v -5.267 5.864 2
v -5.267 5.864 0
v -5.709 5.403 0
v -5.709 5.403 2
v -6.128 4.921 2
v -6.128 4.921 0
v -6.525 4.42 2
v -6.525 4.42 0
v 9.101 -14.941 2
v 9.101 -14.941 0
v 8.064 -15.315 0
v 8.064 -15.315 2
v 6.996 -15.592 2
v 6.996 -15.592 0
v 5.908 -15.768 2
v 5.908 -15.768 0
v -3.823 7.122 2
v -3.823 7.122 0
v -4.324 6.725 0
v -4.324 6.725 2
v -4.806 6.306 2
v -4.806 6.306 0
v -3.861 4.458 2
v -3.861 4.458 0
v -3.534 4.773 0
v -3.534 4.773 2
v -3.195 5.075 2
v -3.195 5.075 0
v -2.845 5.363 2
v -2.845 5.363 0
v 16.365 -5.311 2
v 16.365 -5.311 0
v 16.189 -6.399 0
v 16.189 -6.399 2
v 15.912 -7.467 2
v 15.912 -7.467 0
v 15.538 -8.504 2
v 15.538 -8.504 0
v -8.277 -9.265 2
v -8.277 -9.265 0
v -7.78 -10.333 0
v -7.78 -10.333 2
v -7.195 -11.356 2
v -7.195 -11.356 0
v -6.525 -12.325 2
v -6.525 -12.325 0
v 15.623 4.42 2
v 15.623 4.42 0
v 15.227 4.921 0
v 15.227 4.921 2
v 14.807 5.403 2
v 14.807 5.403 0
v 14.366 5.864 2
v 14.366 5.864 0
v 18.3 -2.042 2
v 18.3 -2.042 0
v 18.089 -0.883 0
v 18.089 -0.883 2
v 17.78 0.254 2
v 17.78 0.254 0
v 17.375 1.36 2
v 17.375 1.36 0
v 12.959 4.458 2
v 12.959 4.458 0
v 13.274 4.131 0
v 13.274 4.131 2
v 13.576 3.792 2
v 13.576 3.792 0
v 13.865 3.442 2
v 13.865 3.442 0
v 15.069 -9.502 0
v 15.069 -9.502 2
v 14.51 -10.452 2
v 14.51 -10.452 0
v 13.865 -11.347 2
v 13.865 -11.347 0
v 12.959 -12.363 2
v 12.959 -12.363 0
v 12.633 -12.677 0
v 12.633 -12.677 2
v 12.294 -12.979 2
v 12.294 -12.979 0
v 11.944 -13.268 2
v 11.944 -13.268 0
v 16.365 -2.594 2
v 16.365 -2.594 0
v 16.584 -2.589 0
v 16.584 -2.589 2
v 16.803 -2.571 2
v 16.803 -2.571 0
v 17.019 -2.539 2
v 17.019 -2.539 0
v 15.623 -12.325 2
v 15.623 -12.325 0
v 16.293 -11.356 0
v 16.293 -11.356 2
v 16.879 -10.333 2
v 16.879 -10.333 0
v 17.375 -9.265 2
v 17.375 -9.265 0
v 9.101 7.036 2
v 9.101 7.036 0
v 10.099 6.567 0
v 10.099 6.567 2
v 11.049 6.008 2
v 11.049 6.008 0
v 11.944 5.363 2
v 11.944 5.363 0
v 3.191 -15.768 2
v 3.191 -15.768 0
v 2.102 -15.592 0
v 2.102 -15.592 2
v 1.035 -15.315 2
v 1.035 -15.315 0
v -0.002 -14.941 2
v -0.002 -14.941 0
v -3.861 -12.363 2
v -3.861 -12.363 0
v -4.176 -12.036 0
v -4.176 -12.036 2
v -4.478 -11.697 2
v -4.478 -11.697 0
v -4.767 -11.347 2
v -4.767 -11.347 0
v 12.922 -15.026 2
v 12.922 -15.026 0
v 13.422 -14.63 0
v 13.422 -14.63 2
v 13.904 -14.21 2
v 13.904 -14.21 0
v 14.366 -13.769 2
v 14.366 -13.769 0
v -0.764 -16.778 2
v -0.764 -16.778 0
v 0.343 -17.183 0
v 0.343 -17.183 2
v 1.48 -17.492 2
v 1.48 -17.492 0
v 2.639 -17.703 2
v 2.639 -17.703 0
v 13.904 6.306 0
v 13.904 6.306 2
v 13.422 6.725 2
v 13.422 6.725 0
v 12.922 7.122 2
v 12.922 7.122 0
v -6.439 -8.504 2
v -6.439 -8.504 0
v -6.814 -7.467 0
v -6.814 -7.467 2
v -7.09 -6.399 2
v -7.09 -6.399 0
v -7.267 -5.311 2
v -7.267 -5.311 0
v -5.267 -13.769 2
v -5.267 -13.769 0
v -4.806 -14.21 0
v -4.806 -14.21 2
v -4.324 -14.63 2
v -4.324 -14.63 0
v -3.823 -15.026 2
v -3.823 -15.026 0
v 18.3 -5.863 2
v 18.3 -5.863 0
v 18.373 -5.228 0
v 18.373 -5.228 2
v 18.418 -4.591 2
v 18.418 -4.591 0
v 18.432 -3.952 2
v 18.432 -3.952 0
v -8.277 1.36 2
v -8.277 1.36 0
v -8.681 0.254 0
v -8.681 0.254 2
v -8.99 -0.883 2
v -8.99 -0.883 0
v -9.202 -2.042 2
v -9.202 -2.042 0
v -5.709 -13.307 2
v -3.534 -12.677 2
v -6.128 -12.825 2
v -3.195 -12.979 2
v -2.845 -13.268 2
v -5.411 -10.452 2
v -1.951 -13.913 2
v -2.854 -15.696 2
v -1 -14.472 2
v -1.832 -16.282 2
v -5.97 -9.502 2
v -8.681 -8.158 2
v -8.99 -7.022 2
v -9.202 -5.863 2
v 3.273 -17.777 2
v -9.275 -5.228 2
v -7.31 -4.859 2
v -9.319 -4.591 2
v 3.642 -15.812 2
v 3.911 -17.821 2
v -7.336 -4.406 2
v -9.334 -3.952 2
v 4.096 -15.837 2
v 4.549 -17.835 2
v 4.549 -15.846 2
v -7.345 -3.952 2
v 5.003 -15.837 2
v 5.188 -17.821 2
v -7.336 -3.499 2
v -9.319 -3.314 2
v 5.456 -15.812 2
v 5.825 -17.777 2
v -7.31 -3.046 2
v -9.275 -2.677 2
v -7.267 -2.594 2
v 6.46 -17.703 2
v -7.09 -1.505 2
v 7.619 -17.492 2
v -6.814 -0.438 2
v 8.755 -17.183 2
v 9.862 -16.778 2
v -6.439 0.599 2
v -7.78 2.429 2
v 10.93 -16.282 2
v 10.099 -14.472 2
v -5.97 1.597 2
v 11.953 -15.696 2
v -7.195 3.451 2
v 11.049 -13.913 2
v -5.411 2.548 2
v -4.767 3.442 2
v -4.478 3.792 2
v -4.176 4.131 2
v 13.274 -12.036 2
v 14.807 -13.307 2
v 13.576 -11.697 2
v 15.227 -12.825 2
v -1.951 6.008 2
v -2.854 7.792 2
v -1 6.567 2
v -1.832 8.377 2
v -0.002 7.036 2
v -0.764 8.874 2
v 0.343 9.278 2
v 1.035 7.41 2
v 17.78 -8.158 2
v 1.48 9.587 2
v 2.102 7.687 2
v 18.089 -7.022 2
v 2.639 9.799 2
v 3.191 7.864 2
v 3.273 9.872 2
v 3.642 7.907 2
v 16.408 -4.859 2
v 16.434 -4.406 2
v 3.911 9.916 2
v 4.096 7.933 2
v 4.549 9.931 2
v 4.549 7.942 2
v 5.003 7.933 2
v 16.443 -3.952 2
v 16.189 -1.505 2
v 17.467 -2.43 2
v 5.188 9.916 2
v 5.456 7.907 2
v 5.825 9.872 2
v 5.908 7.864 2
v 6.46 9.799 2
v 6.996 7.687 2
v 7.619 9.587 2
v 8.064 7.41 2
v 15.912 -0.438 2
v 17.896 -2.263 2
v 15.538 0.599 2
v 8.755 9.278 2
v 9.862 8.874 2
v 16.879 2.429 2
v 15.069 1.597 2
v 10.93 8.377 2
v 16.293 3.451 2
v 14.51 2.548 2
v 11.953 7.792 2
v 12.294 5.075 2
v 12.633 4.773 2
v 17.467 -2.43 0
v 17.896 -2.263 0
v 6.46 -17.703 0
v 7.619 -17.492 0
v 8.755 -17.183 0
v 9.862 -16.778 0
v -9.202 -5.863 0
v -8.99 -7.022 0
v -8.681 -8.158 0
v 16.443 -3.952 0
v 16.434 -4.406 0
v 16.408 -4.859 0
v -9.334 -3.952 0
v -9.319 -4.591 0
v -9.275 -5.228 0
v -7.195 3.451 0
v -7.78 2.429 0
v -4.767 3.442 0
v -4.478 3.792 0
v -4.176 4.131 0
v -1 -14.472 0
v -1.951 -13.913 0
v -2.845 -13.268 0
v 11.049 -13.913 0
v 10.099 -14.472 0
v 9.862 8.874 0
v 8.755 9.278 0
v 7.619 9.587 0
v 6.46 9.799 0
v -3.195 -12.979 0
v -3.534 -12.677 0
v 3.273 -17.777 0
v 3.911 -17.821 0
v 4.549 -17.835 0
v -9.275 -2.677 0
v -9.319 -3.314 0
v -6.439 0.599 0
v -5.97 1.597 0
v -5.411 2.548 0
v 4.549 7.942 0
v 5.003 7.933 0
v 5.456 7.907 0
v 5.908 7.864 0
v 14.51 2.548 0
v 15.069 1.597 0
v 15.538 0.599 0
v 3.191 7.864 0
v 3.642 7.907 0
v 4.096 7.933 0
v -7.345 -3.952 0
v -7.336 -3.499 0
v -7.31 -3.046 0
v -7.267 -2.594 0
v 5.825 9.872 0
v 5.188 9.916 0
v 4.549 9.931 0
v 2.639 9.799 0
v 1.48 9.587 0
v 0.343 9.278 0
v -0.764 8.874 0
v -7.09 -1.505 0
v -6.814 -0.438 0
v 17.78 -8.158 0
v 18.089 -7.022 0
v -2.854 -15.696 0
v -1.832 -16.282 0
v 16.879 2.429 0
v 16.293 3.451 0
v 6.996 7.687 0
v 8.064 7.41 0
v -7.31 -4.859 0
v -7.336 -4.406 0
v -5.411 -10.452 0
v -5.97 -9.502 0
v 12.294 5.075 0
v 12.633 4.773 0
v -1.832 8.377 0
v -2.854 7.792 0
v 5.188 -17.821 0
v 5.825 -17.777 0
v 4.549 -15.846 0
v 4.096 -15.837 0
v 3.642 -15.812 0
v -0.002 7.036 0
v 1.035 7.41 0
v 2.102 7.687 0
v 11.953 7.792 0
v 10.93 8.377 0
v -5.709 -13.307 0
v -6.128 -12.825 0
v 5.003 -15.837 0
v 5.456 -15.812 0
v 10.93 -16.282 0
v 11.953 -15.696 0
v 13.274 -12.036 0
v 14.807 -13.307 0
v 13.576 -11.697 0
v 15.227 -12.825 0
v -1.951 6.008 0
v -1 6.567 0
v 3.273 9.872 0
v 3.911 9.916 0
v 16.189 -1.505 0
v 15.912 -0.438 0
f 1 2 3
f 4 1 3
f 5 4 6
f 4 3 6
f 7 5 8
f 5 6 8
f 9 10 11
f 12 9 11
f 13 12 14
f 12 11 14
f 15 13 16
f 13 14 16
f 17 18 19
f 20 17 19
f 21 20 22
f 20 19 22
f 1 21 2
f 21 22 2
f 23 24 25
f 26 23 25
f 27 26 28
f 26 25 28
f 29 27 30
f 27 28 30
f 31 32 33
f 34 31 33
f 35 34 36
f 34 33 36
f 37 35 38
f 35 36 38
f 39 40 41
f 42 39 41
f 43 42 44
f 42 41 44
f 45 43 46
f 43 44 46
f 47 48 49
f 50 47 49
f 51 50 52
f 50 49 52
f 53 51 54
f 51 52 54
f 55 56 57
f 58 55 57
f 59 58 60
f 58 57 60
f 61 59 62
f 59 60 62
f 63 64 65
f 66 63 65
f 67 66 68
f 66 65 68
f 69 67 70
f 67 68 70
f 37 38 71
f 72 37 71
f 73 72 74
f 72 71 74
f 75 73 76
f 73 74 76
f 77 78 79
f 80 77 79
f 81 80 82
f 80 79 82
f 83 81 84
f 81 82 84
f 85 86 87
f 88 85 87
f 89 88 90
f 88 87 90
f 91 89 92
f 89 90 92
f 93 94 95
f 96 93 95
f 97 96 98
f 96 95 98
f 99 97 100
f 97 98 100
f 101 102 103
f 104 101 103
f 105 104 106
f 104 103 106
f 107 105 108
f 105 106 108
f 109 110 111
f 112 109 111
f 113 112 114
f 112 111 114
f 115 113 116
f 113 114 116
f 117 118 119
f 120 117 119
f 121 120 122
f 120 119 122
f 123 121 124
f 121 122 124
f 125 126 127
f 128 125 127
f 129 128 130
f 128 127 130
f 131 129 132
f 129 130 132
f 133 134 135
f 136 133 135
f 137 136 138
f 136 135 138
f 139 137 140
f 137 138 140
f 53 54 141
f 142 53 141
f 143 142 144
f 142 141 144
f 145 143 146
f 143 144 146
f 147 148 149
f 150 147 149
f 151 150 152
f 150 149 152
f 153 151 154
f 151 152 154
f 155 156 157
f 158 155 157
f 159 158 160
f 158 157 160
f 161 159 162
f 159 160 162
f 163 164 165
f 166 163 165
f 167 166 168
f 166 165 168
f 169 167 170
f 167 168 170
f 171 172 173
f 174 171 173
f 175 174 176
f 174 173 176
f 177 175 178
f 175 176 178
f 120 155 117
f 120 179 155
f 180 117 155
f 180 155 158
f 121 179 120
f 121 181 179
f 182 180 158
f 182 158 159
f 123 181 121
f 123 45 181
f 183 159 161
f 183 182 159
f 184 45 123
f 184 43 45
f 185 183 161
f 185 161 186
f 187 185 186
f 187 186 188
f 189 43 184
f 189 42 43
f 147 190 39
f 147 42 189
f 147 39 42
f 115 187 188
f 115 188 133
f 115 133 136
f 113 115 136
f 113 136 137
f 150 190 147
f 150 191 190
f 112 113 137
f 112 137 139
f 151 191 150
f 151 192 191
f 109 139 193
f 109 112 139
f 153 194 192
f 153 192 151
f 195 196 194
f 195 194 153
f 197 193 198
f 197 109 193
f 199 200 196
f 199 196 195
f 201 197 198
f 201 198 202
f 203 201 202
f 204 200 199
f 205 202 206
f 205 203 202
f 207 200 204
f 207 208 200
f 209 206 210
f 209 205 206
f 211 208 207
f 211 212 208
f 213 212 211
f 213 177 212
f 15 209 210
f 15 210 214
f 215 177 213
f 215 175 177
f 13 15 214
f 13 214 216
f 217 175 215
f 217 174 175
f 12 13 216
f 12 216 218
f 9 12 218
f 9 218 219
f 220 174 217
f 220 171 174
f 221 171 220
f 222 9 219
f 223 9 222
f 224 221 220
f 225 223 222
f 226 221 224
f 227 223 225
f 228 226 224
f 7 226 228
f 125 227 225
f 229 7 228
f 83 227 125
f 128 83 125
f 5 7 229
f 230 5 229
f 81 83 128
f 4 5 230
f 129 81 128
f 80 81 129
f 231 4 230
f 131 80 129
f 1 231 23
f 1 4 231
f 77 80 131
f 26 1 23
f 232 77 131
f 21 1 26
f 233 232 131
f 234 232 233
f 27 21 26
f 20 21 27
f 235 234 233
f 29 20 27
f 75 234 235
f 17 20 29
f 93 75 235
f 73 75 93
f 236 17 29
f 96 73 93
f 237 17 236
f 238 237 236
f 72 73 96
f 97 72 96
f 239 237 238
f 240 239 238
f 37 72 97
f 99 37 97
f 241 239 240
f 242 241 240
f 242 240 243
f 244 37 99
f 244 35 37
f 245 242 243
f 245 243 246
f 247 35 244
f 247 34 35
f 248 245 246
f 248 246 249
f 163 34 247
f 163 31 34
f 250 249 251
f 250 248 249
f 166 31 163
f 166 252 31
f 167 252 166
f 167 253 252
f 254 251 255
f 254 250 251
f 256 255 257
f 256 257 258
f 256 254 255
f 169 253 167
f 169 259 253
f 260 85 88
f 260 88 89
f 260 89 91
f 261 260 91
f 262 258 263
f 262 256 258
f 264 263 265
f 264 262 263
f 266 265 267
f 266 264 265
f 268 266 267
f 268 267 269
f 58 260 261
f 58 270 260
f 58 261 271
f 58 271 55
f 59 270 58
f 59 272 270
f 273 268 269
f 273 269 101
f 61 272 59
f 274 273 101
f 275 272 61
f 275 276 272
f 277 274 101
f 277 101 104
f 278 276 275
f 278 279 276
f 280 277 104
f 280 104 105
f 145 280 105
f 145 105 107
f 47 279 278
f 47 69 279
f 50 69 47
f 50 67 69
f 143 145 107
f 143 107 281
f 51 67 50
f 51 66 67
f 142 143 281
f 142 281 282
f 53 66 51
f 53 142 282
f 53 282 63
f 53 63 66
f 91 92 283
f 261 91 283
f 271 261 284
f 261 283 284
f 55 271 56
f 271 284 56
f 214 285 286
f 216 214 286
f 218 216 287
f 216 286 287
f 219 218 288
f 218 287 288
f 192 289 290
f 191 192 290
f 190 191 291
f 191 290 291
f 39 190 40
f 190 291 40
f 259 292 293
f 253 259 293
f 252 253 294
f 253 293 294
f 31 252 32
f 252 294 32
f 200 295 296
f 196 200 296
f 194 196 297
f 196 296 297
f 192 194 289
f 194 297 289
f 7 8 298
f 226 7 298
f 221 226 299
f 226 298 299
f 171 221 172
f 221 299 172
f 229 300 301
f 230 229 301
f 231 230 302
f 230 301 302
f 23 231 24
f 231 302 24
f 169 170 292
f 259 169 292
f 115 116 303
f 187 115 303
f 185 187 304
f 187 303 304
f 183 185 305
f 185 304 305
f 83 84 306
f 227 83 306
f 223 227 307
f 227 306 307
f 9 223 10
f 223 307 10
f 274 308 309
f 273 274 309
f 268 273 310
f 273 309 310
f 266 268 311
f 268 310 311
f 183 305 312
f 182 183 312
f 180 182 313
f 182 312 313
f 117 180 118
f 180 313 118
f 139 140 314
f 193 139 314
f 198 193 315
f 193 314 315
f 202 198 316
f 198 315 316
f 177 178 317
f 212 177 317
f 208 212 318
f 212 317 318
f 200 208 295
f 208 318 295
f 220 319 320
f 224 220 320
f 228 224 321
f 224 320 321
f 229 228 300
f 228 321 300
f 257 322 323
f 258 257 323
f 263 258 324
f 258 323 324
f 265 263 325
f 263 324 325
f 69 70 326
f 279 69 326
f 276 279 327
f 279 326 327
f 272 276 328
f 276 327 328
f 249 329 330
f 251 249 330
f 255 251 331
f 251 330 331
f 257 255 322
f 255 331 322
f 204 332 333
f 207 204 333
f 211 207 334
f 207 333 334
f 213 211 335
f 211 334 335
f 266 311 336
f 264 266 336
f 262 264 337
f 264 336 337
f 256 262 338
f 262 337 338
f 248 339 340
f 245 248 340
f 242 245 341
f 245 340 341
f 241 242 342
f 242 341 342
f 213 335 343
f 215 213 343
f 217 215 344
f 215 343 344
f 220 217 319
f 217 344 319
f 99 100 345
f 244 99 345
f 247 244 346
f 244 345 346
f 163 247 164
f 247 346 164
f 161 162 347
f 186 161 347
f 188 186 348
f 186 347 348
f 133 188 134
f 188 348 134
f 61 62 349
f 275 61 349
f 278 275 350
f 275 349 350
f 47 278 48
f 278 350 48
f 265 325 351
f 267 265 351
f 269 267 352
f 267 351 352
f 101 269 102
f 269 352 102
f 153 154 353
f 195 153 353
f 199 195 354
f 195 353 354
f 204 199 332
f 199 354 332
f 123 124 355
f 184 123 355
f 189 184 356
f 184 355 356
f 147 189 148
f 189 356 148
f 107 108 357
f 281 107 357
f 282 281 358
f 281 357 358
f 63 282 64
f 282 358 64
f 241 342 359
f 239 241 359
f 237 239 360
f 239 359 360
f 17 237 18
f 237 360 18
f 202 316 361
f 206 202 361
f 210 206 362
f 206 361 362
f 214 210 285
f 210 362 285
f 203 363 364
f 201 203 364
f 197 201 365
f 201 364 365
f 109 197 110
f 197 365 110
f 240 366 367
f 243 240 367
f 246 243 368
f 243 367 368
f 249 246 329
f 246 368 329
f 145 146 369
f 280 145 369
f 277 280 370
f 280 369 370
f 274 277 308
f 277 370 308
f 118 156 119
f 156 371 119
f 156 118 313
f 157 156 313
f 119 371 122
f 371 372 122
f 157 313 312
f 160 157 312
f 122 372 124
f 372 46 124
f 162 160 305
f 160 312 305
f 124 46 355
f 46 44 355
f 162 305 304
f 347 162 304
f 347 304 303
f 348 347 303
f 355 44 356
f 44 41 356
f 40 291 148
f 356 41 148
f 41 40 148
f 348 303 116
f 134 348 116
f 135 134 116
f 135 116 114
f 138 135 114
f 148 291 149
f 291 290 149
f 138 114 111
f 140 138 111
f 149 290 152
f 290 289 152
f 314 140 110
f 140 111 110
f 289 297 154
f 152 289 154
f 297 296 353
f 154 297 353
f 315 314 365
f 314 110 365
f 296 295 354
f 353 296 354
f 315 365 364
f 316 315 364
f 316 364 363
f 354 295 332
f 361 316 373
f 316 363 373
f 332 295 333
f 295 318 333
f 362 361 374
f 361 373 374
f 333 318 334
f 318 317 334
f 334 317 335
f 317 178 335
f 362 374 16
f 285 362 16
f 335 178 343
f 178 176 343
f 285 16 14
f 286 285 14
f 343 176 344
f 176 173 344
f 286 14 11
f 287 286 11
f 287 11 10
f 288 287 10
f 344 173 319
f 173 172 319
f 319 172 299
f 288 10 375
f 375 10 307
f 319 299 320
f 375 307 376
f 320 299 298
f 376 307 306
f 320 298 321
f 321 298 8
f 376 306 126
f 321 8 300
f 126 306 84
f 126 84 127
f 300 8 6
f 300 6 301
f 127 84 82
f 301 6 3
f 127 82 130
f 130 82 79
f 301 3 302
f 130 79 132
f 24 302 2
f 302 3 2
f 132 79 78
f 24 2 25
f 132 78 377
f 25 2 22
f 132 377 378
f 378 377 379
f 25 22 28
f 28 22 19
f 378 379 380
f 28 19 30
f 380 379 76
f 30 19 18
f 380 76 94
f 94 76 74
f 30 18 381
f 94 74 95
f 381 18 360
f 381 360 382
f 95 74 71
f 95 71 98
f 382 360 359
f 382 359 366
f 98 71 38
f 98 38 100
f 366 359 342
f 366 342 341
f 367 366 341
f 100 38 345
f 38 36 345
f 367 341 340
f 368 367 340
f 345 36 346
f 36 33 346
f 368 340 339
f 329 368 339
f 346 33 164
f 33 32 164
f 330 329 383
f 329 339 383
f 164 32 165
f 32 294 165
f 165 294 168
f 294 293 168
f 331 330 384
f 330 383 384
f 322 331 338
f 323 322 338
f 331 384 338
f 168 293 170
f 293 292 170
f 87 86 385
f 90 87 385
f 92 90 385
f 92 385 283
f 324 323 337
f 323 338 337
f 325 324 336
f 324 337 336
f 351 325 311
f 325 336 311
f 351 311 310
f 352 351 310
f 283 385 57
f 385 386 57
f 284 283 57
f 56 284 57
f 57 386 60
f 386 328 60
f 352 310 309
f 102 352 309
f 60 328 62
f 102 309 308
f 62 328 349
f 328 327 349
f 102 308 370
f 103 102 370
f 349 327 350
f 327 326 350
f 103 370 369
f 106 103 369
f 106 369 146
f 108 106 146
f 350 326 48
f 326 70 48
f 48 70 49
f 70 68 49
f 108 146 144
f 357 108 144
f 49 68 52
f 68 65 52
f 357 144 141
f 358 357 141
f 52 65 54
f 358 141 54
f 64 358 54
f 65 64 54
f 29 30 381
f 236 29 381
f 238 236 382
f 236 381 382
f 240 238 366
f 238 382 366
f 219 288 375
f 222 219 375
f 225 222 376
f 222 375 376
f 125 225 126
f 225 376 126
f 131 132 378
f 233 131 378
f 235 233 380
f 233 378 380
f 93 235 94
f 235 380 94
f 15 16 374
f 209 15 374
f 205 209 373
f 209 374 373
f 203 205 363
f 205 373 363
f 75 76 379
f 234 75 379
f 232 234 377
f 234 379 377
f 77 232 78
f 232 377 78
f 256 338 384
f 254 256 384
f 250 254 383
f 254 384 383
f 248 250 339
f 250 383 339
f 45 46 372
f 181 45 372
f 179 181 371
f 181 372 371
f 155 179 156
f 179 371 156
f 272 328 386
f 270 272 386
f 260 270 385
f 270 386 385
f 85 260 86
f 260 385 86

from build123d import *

# Parameters (mm, degrees)
F2_DEPTH = 2


with BuildPart() as f2:
    # F1 (on face) → F2 (new body)
    with BuildSketch(Plane.XY):
        with BuildLine():
            ThreePointArc((18.3001549066, -2.0420113713), (17.9462510765, -0.3112895728), (17.3754329945, 1.3604797241))
            Line((17.3754329945, 1.3604797241), (15.5377167825, 0.5992727453))
            ThreePointArc((15.5377167825, 0.5992727453), (16.0627067105, -0.968422059), (16.3652392751, -2.593769859))
            ThreePointArc((16.3652392751, -2.593769859), (16.6935081093, -2.5817022248), (17.0192561264, -2.5393432276))
            ThreePointArc((17.0192561264, -2.5393432276), (17.6839972454, -2.3532416527), (18.3001549066, -2.0420113713))
        make_face()
        with BuildLine():
            Line((15.5377167825, 0.5992727453), (17.3754329945, 1.3604797241))
            ThreePointArc((17.3754329945, 1.3604797241), (16.5969429247, 2.9462284671), (15.6233856027, 4.4202813853))
            ThreePointArc((15.6233856027, 4.4202813853), (14.6734726061, 4.0584412817), (13.8650414705, 3.4422415894))
            ThreePointArc((13.8650414705, 3.4422415894), (14.8004130937, 2.0790243103), (15.5377167825, 0.5992727453))
        make_face()
        with BuildLine():
            ThreePointArc((13.8650414705, 3.4422415894), (14.6734726061, 4.0584412817), (15.6233856027, 4.4202813853))
            ThreePointArc((15.6233856027, 4.4202813853), (15.0196144043, 5.16406253), (14.3659866612, 5.8644344489))
            Line((14.3659866612, 5.8644344489), (12.9594595658, 4.4579073535))
            ThreePointArc((12.9594595658, 4.4579073535), (13.4267875285, 3.9630358747), (13.8650414705, 3.4422415894))
        make_face()
        with BuildLine():
            ThreePointArc((18.3001549066, -5.8625828565), (18.399156889, -4.9097194566), (18.4322100127, -3.9522971139))
            Line((18.4322100127, -3.9522971139), (16.4430803185, -3.9522971139))
            ThreePointArc((16.4430803185, -3.9522971139), (16.4236041115, -4.6326748639), (16.3652392751, -5.3108243689))
            ThreePointArc((16.3652392751, -5.3108243689), (17.3726053942, -5.446752526), (18.3001549066, -5.8625828565))
        make_face()
        with BuildLine():
            Line((12.9594595658, 4.4579073535), (14.3659866612, 5.8644344489))
            ThreePointArc((14.3659866612, 5.8644344489), (13.6656147423, 6.518062192), (12.9218335976, 7.1218333904))
            ThreePointArc((12.9218335976, 7.1218333904), (12.559993494, 6.1719203938), (11.9437938017, 5.3634892582))
            ThreePointArc((11.9437938017, 5.3634892582), (12.464588087, 4.9252353162), (12.9594595658, 4.4579073535))
        make_face()
        with BuildLine():
            ThreePointArc((17.3754329945, -9.2650739519), (17.9462510765, -7.593304655), (18.3001549066, -5.8625828565))
            ThreePointArc((18.3001549066, -5.8625828565), (17.3726053942, -5.446752526), (16.3652392751, -5.3108243689))
            ThreePointArc((16.3652392751, -5.3108243689), (16.0627067105, -6.9361721689), (15.5377167825, -8.5038669731))
            Line((15.5377167825, -8.5038669731), (17.3754329945, -9.2650739519))
        make_face()
        with BuildLine():
            ThreePointArc((11.9437938017, 5.3634892582), (12.559993494, 6.1719203938), (12.9218335976, 7.1218333904))
            ThreePointArc((12.9218335976, 7.1218333904), (11.4477806794, 8.0953907124), (9.8620319364, 8.8738807822))
            Line((9.8620319364, 8.8738807822), (9.1008249576, 7.0361645702))
            ThreePointArc((9.1008249576, 7.0361645702), (10.5805765226, 6.2988608814), (11.9437938017, 5.3634892582))
        make_face()
        with BuildLine():
            ThreePointArc((15.6233856027, -12.3248756131), (16.5969429247, -10.8508226949), (17.3754329945, -9.2650739519))
            Line((17.3754329945, -9.2650739519), (15.5377167825, -8.5038669731))
            ThreePointArc((15.5377167825, -8.5038669731), (14.8004130937, -9.9836185381), (13.8650414705, -11.3468358173))
            ThreePointArc((13.8650414705, -11.3468358173), (14.6734726061, -11.9630355095), (15.6233856027, -12.3248756131))
        make_face()
        with BuildLine():
            Line((9.1008249576, 7.0361645702), (9.8620319364, 8.8738807822))
            ThreePointArc((9.8620319364, 8.8738807822), (8.1902626395, 9.4446988642), (6.459540841, 9.7986026942))
            ThreePointArc((6.459540841, 9.7986026942), (6.0437105105, 8.8710531819), (5.9077823533, 7.8636870628))
            ThreePointArc((5.9077823533, 7.8636870628), (7.5331301533, 7.5611544982), (9.1008249576, 7.0361645702))
        make_face()
        with BuildLine():
            ThreePointArc((14.3659866612, -13.7690286767), (15.0196144043, -13.0686567579), (15.6233856027, -12.3248756131))
            ThreePointArc((15.6233856027, -12.3248756131), (14.6734726061, -11.9630355095), (13.8650414705, -11.3468358173))
            ThreePointArc((13.8650414705, -11.3468358173), (13.4267875285, -11.8676301025), (12.9594595658, -12.3625015813))
            Line((12.9594595658, -12.3625015813), (14.3659866612, -13.7690286767))
        make_face()
        with BuildLine():
            ThreePointArc((5.9077823533, 7.8636870628), (6.0437105105, 8.8710531819), (6.459540841, 9.7986026942))
            ThreePointArc((6.459540841, 9.7986026942), (5.5066774411, 9.8976046767), (4.5492550984, 9.9306578004))
            Line((4.5492550984, 9.9306578004), (4.5492550984, 7.9415281062))
            ThreePointArc((4.5492550984, 7.9415281062), (5.2296328483, 7.9220518992), (5.9077823533, 7.8636870628))
        make_face()
        with BuildLine():
            ThreePointArc((12.9218335976, -15.0264276183), (13.6656147423, -14.4226564199), (14.3659866612, -13.7690286767))
            Line((14.3659866612, -13.7690286767), (12.9594595658, -12.3625015813))
            ThreePointArc((12.9594595658, -12.3625015813), (12.464588087, -12.829829544), (11.9437938017, -13.2680834861))
            ThreePointArc((11.9437938017, -13.2680834861), (12.559993494, -14.0765146217), (12.9218335976, -15.0264276183))
        make_face()
        with BuildLine():
            Line((4.5492550984, 7.9415281062), (4.5492550984, 9.9306578004))
            ThreePointArc((4.5492550984, 9.9306578004), (3.5918327557, 9.8976046767), (2.6389693558, 9.7986026942))
            ThreePointArc((2.6389693558, 9.7986026942), (3.0547996863, 8.8710531819), (3.1907278434, 7.8636870628))
            ThreePointArc((3.1907278434, 7.8636870628), (3.8688773484, 7.9220518992), (4.5492550984, 7.9415281062))
        make_face()
        with BuildLine():
            ThreePointArc((9.8620319364, -16.77847501), (11.4477806794, -15.9999849403), (12.9218335976, -15.0264276183))
            ThreePointArc((12.9218335976, -15.0264276183), (12.559993494, -14.0765146217), (11.9437938017, -13.2680834861))
            ThreePointArc((11.9437938017, -13.2680834861), (10.5805765226, -14.2034551093), (9.1008249576, -14.9407587981))
            Line((9.1008249576, -14.9407587981), (9.8620319364, -16.77847501))
        make_face()
        with BuildLine():
            ThreePointArc((3.1907278434, 7.8636870628), (3.0547996863, 8.8710531819), (2.6389693558, 9.7986026942))
            ThreePointArc((2.6389693558, 9.7986026942), (0.9082475573, 9.4446988642), (-0.7635217396, 8.8738807822))
            Line((-0.7635217396, 8.8738807822), (-0.0023147608, 7.0361645702))
            ThreePointArc((-0.0023147608, 7.0361645702), (1.5653800434, 7.5611544982), (3.1907278434, 7.8636870628))
        make_face()
        with BuildLine():
            ThreePointArc((6.459540841, -17.7031969221), (8.1902626395, -17.3492930921), (9.8620319364, -16.77847501))
            Line((9.8620319364, -16.77847501), (9.1008249576, -14.9407587981))
            ThreePointArc((9.1008249576, -14.9407587981), (7.5331301533, -15.465748726), (5.9077823533, -15.7682812907))
            ThreePointArc((5.9077823533, -15.7682812907), (6.0437105105, -16.7756474097), (6.459540841, -17.7031969221))
        make_face()
        with BuildLine():
            Line((-0.0023147608, 7.0361645702), (-0.7635217396, 8.8738807822))
            ThreePointArc((-0.7635217396, 8.8738807822), (-2.3492704826, 8.0953907124), (-3.8233234008, 7.1218333904))
            ThreePointArc((-3.8233234008, 7.1218333904), (-3.4614832972, 6.1719203938), (-2.845283605, 5.3634892582))
            ThreePointArc((-2.845283605, 5.3634892582), (-1.4820663258, 6.2988608814), (-0.0023147608, 7.0361645702))
        make_face()
        with BuildLine():
            ThreePointArc((4.5492550984, -17.8352520282), (5.5066774411, -17.8021989046), (6.459540841, -17.7031969221))
            ThreePointArc((6.459540841, -17.7031969221), (6.0437105105, -16.7756474097), (5.9077823533, -15.7682812907))
            ThreePointArc((5.9077823533, -15.7682812907), (5.2296328483, -15.826646127), (4.5492550984, -15.8461223341))
            Line((4.5492550984, -15.8461223341), (4.5492550984, -17.8352520282))
        make_face()
        with BuildLine():
            ThreePointArc((-2.845283605, 5.3634892582), (-3.4614832972, 6.1719203938), (-3.8233234008, 7.1218333904))
            ThreePointArc((-3.8233234008, 7.1218333904), (-4.5671045455, 6.518062192), (-5.2674764644, 5.8644344489))
            Line((-5.2674764644, 5.8644344489), (-3.860949369, 4.4579073535))
            ThreePointArc((-3.860949369, 4.4579073535), (-3.3660778902, 4.9252353162), (-2.845283605, 5.3634892582))
        make_face()
        with BuildLine():
            ThreePointArc((2.6389693558, -17.7031969221), (3.5918327557, -17.8021989046), (4.5492550984, -17.8352520282))
            Line((4.5492550984, -17.8352520282), (4.5492550984, -15.8461223341))
            ThreePointArc((4.5492550984, -15.8461223341), (3.8688773484, -15.826646127), (3.1907278434, -15.7682812907))
            ThreePointArc((3.1907278434, -15.7682812907), (3.0547996863, -16.7756474097), (2.6389693558, -17.7031969221))
        make_face()
        with BuildLine():
            Line((-3.860949369, 4.4579073535), (-5.2674764644, 5.8644344489))
            ThreePointArc((-5.2674764644, 5.8644344489), (-5.9211042076, 5.16406253), (-6.524875406, 4.4202813853))
            ThreePointArc((-6.524875406, 4.4202813853), (-5.5749624094, 4.0584412817), (-4.7665312738, 3.4422415894))
            ThreePointArc((-4.7665312738, 3.4422415894), (-4.3282773317, 3.9630358747), (-3.860949369, 4.4579073535))
        make_face()
        with BuildLine():
            ThreePointArc((-0.7635217396, -16.77847501), (0.9082475573, -17.3492930921), (2.6389693558, -17.7031969221))
            ThreePointArc((2.6389693558, -17.7031969221), (3.0547996863, -16.7756474097), (3.1907278434, -15.7682812907))
            ThreePointArc((3.1907278434, -15.7682812907), (1.5653800434, -15.465748726), (-0.0023147608, -14.9407587981))
            Line((-0.0023147608, -14.9407587981), (-0.7635217396, -16.77847501))
        make_face()
        with BuildLine():
            ThreePointArc((-4.7665312738, 3.4422415894), (-5.5749624094, 4.0584412817), (-6.524875406, 4.4202813853))
            ThreePointArc((-6.524875406, 4.4202813853), (-7.498432728, 2.9462284671), (-8.2769227977, 1.3604797241))
            Line((-8.2769227977, 1.3604797241), (-6.4392065858, 0.5992727453))
            ThreePointArc((-6.4392065858, 0.5992727453), (-5.701902897, 2.0790243103), (-4.7665312738, 3.4422415894))
        make_face()
        with BuildLine():
            ThreePointArc((-3.8233234008, -15.0264276183), (-2.3492704826, -15.9999849403), (-0.7635217396, -16.77847501))
            Line((-0.7635217396, -16.77847501), (-0.0023147608, -14.9407587981))
            ThreePointArc((-0.0023147608, -14.9407587981), (-1.4820663258, -14.2034551093), (-2.845283605, -13.2680834861))
            ThreePointArc((-2.845283605, -13.2680834861), (-3.4614832972, -14.0765146217), (-3.8233234008, -15.0264276183))
        make_face()
        with BuildLine():
            Line((-6.4392065858, 0.5992727453), (-8.2769227977, 1.3604797241))
            ThreePointArc((-8.2769227977, 1.3604797241), (-8.8477408798, -0.3112895728), (-9.2016447098, -2.0420113713))
            ThreePointArc((-9.2016447098, -2.0420113713), (-8.2740951974, -2.4578417018), (-7.2667290784, -2.593769859))
            ThreePointArc((-7.2667290784, -2.593769859), (-6.9641965137, -0.968422059), (-6.4392065858, 0.5992727453))
        make_face()
        with BuildLine():
            ThreePointArc((-5.2674764644, -13.7690286767), (-4.5671045455, -14.4226564199), (-3.8233234008, -15.0264276183))
            ThreePointArc((-3.8233234008, -15.0264276183), (-3.4614832972, -14.0765146217), (-2.845283605, -13.2680834861))
            ThreePointArc((-2.845283605, -13.2680834861), (-3.3660778902, -12.829829544), (-3.860949369, -12.3625015813))
            Line((-3.860949369, -12.3625015813), (-5.2674764644, -13.7690286767))
        make_face()
        with BuildLine():
            ThreePointArc((-7.2667290784, -2.593769859), (-8.2740951974, -2.4578417018), (-9.2016447098, -2.0420113713))
            ThreePointArc((-9.2016447098, -2.0420113713), (-9.3006466923, -2.9948747712), (-9.3336998159, -3.9522971139))
            Line((-9.3336998159, -3.9522971139), (-7.3445701218, -3.9522971139))
            ThreePointArc((-7.3445701218, -3.9522971139), (-7.3250939147, -3.271919364), (-7.2667290784, -2.593769859))
        make_face()
        with BuildLine():
            ThreePointArc((-6.524875406, -12.3248756131), (-5.9211042076, -13.0686567579), (-5.2674764644, -13.7690286767))
            Line((-5.2674764644, -13.7690286767), (-3.860949369, -12.3625015813))
            ThreePointArc((-3.860949369, -12.3625015813), (-4.3282773317, -11.8676301025), (-4.7665312738, -11.3468358173))
            ThreePointArc((-4.7665312738, -11.3468358173), (-5.5749624094, -11.9630355095), (-6.524875406, -12.3248756131))
        make_face()
        with BuildLine():
            Line((-7.3445701218, -3.9522971139), (-9.3336998159, -3.9522971139))
            ThreePointArc((-9.3336998159, -3.9522971139), (-9.3006466923, -4.9097194566), (-9.2016447098, -5.8625828565))
            ThreePointArc((-9.2016447098, -5.8625828565), (-8.2740951974, -5.446752526), (-7.2667290784, -5.3108243689))
            ThreePointArc((-7.2667290784, -5.3108243689), (-7.3250939147, -4.6326748639), (-7.3445701218, -3.9522971139))
        make_face()
        with BuildLine():
            ThreePointArc((-8.2769227977, -9.2650739519), (-7.498432728, -10.8508226949), (-6.524875406, -12.3248756131))
            ThreePointArc((-6.524875406, -12.3248756131), (-5.5749624094, -11.9630355095), (-4.7665312738, -11.3468358173))
            ThreePointArc((-4.7665312738, -11.3468358173), (-5.701902897, -9.9836185381), (-6.4392065858, -8.5038669731))
            Line((-6.4392065858, -8.5038669731), (-8.2769227977, -9.2650739519))
        make_face()
        with BuildLine():
            ThreePointArc((-7.2667290784, -5.3108243689), (-8.2740951974, -5.446752526), (-9.2016447098, -5.8625828565))
            ThreePointArc((-9.2016447098, -5.8625828565), (-8.8477408798, -7.593304655), (-8.2769227977, -9.2650739519))
            Line((-8.2769227977, -9.2650739519), (-6.4392065858, -8.5038669731))
            ThreePointArc((-6.4392065858, -8.5038669731), (-6.9641965137, -6.9361721689), (-7.2667290784, -5.3108243689))
        make_face()
    extrude(amount=F2_DEPTH)


solid = f2.part
